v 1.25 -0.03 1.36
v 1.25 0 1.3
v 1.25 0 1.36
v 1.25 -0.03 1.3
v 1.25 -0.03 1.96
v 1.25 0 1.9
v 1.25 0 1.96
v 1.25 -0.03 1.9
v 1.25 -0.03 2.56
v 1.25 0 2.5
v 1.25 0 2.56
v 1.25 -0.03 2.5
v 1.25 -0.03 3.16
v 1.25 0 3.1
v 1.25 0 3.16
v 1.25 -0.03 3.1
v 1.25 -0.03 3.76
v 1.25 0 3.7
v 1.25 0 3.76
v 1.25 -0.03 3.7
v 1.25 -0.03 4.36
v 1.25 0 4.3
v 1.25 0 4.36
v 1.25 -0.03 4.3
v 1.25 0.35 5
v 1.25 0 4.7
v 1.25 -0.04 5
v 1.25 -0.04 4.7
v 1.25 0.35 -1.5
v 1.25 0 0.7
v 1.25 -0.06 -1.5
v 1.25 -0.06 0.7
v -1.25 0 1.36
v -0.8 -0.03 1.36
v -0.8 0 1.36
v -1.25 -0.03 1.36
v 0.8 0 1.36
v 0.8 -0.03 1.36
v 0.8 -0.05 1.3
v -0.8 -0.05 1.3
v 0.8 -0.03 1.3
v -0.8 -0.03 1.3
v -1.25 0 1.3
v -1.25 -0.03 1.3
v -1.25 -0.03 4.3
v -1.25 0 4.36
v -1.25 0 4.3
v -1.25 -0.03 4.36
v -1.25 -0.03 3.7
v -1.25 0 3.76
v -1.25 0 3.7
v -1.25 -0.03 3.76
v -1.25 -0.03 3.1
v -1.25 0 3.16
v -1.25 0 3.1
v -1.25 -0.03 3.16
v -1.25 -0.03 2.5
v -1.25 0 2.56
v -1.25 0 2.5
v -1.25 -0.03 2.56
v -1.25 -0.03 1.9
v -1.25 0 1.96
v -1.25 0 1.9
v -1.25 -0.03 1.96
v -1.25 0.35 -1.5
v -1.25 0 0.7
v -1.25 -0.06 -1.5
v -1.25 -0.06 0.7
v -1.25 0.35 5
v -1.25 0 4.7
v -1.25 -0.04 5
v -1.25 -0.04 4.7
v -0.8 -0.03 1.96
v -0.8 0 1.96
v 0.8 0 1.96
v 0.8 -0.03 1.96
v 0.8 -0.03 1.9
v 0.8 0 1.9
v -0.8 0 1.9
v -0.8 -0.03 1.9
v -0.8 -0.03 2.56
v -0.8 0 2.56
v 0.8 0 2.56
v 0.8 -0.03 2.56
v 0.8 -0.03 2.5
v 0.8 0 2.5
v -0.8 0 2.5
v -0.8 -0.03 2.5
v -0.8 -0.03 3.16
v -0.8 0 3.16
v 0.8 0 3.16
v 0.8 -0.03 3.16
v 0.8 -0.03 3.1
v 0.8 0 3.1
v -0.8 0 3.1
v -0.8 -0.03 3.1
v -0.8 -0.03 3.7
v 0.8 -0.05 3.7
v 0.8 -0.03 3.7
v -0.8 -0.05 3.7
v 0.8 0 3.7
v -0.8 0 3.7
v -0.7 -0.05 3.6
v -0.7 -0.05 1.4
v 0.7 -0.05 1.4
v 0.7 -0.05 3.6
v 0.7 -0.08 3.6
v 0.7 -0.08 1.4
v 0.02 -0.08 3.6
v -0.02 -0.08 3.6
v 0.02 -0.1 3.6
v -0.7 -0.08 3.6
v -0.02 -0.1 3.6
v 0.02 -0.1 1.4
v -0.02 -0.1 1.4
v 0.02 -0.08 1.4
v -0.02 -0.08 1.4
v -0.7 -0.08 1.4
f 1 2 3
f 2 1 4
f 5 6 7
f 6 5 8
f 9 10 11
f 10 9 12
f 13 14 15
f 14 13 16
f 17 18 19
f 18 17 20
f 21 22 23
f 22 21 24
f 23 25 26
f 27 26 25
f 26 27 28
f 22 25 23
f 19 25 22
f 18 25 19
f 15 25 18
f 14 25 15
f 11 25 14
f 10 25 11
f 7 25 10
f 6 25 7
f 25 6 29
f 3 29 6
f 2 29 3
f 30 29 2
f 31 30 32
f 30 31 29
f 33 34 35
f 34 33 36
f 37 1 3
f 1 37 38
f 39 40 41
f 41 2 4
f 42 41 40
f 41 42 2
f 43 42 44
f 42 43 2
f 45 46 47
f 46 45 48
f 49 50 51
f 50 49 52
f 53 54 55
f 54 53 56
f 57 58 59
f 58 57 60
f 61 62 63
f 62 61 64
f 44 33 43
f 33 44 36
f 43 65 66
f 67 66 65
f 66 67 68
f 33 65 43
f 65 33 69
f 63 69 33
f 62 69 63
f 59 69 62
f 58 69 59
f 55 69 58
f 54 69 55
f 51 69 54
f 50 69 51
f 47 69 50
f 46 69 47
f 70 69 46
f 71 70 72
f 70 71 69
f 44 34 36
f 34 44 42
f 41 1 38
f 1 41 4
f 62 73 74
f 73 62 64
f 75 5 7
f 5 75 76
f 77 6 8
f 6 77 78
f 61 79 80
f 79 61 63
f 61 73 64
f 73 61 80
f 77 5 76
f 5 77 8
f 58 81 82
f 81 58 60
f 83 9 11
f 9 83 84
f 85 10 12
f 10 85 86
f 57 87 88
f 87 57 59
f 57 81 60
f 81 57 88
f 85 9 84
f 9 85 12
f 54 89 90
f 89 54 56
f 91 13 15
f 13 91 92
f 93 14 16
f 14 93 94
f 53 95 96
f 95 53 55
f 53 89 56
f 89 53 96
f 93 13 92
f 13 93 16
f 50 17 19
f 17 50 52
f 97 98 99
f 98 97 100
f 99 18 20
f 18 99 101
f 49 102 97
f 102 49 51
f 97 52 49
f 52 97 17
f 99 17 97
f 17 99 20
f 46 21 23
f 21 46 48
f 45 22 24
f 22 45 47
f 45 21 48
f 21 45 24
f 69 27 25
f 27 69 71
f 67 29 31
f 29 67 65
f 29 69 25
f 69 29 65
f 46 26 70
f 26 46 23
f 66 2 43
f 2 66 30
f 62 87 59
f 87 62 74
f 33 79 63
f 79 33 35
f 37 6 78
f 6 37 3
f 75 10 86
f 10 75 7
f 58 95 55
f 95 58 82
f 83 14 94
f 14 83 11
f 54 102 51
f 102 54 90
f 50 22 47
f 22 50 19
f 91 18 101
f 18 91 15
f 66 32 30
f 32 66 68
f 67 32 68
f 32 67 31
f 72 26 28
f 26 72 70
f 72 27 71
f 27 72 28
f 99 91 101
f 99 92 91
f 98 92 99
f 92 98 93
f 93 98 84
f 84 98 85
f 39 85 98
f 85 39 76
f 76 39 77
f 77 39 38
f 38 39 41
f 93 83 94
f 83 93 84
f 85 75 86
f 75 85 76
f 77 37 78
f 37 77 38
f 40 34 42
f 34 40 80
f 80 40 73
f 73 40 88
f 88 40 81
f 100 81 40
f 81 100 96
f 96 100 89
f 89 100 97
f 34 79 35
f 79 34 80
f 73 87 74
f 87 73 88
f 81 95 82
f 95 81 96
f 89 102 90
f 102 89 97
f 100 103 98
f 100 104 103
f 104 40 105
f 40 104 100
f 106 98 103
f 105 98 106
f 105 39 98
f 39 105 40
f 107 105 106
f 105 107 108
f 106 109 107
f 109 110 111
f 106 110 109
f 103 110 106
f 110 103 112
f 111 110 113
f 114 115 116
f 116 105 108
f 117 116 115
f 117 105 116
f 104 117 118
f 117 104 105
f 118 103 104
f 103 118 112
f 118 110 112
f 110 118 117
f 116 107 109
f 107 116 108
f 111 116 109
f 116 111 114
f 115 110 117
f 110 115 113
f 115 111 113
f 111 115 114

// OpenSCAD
// file: lib/lodge_kit.scad
// Lodge shell tile kit — shared dimensions and modules.
//
// The game paints a lodge footprint in 5 m cells and resolves the
// exterior from these tiles at half-cell (2.5 m) resolution; see
// internal/world/lodge_shell.go. Every tile is authored in the same
// canonical frame:
//
//   * origin on the lodge floor plane (Z = 0);
//   * wall-type tiles sit on a footprint edge, centred on it, with the
//     OUTSIDE toward SCAD −Y (game +Z) and the wall thickness toward +Y;
//   * roof tiles are centred on a half-cell, with Z = 0 at the tile's
//     lowest corner; slopes fall toward −Y (game +Z);
//   * corner tiles sit on a grid vertex; an outer corner's building is
//     in the SCAD (−X, +Y) quadrant, an inner corner's notch in (+X, −Y).
//
// Colours are near-neutral: the renderer tints walls and roofs per lodge
// from a seeded palette (world.ShellPalette).
//
// Keep these in sync with the constants in lodge_shell.go.

tile   = 2.5;   // ShellTileSize
wall_h = 5.0;   // ShellWallHeight
rise   = 2.1;   // ShellRoofRise, per tile of run
pitch  = rise / tile;

wall_t   = 0.35;  // wall thickness
sink     = 1.5;   // walls run this far below the floor to hide pad grading
roof_t   = 0.25;  // roof slab thickness
overhang = 0.7;   // eaves overhang past the wall plane

c_wall   = [0.92, 0.90, 0.86];
c_stone  = [0.62, 0.61, 0.60];
c_trim   = [0.97, 0.97, 0.95];
c_glass  = [0.30, 0.42, 0.52];
c_door   = [0.36, 0.25, 0.18];
c_roof   = [0.97, 0.97, 0.97];
c_fascia = [0.55, 0.52, 0.50];

// Plain wall panel: timber above a stone plinth, a trim band under the
// eaves.
module wall_panel() {
    color(c_wall)
        translate([-tile/2, 0, -sink]) cube([tile, wall_t, wall_h + sink]);
    color(c_stone)
        translate([-tile/2, -0.06, -sink]) cube([tile, wall_t, sink + 0.7]);
    color(c_trim)
        translate([-tile/2, -0.04, wall_h - 0.3]) cube([tile, 0.1, 0.3]);
    battens();
}

// Horizontal board lines above the plinth.
module battens() {
    color(c_wall * 0.8)
        for (z = [1.3 : 0.6 : wall_h - 0.6])
            translate([-tile/2, -0.03, z]) cube([tile, 0.04, 0.06]);
}

// A framed pane on the outer face. x0/w along the wall, z0/h up it.
module pane(x0, w, z0, h) {
    color(c_trim)
        translate([x0 - 0.1, -0.05, z0 - 0.1]) cube([w + 0.2, 0.06, h + 0.2]);
    color(c_glass)
        translate([x0, -0.08, z0]) cube([w, 0.06, h]);
}

module wall_window() {
    wall_panel();
    pane(-0.7, 1.4, 1.4, 2.2);
    color(c_trim) translate([-0.02, -0.1, 1.4]) cube([0.04, 0.04, 2.2]); // mullion
}

// Tall window flanked by shutters.
module wall_window_alt() {
    wall_panel();
    pane(-0.5, 1.0, 1.2, 2.8);
    color(c_door) {
        translate([-1.0, -0.1, 1.2]) cube([0.4, 0.05, 2.8]);
        translate([ 0.6, -0.1, 1.2]) cube([0.4, 0.05, 2.8]);
    }
}

// Floor-to-eave glazing for food courts: a low stone sill, then glass in
// three lights.
module wall_glazed() {
    color(c_wall)
        translate([-tile/2, 0, -sink]) cube([tile, wall_t, wall_h + sink]);
    color(c_stone)
        translate([-tile/2, -0.06, -sink]) cube([tile, wall_t, sink + 0.35]);
    color(c_glass)
        translate([-tile/2, -0.09, 0.35]) cube([tile, 0.06, wall_h - 0.75]);
    color(c_trim) {
        for (x = [-tile/2, -tile/6, tile/6, tile/2 - 0.08])
            translate([x, -0.12, 0.35]) cube([0.08, 0.06, wall_h - 0.75]);
        translate([-tile/2, -0.12, wall_h - 0.45]) cube([tile, 0.07, 0.1]);
    }
}

// Glazed entry door under a small canopy, with a step.
module door() {
    color(c_wall)
        translate([-tile/2, 0, -sink]) cube([tile, wall_t, wall_h + sink]);
    color(c_stone)
        translate([-tile/2, -0.06, -sink]) cube([tile, wall_t, sink + 0.15]);
    battens();
    color(c_door)
        translate([-0.9, -0.1, 0]) cube([1.8, 0.1, 2.7]);
    color(c_glass) {
        translate([-0.75, -0.13, 0.9]) cube([0.65, 0.05, 1.6]);
        translate([ 0.10, -0.13, 0.9]) cube([0.65, 0.05, 1.6]);
    }
    color(c_trim)
        translate([-tile/2, -0.04, wall_h - 0.3]) cube([tile, 0.1, 0.3]);
    color(c_roof)   // canopy
        translate([-1.2, -1.3, 3.0])
            rotate([-12, 0, 0]) cube([2.4, 1.3, 0.12]);
    color(c_stone)  // step
        translate([-1.1, -0.9, -0.3]) cube([2.2, 0.9, 0.42]);
}

module corner_outer() {
    color(c_stone)
        translate([-0.3, -0.05, -sink]) cube([0.35, 0.35, wall_h + sink - 0.3]);
}

module corner_inner() {
    color(c_trim)
        translate([0, -0.12, 0]) cube([0.12, 0.12, wall_h - 0.3]);
}

// Roof slab over one half-cell. h lists corner heights (in rise units)
// in SCAD order (−X,+Y), (+X,+Y), (+X,−Y), (−X,−Y); split names which
// diagonal the top surface folds along: 0 through corners 0–2, 1
// through corners 1–3.
module roof_tile(h, split) {
    p = [[-tile/2, tile/2], [tile/2, tile/2], [tile/2, -tile/2], [-tile/2, -tile/2]];
    top = [for (i = [0:3]) [p[i][0], p[i][1], h[i] * rise]];
    bot = [for (i = [0:3]) [p[i][0], p[i][1], h[i] * rise - roof_t]];
    tris = split == 0 ? [[0, 1, 2], [0, 2, 3]] : [[0, 1, 3], [1, 2, 3]];
    color(c_roof)
        polyhedron(
            points = concat(top, bot),
            faces = concat(
                // top (clockwise seen from above = outward in OpenSCAD)
                [for (t = tris) [t[0], t[1], t[2]]],
                [for (t = tris) [t[2] + 4, t[1] + 4, t[0] + 4]],
                [for (i = [0:3]) [i, i + 4, (i + 1) % 4 + 4, (i + 1) % 4]]
            ));
}

// Eaves strip past a wall edge: continues the roof plane outward and
// down, finished with a fascia board.
module eave() {
    drop = overhang * pitch;
    color(c_roof)
        polyhedron(
            points = [
                [-tile/2, 0, 0], [tile/2, 0, 0], [tile/2, -overhang, -drop], [-tile/2, -overhang, -drop],
                [-tile/2, 0, -roof_t], [tile/2, 0, -roof_t], [tile/2, -overhang, -drop - roof_t], [-tile/2, -overhang, -drop - roof_t],
            ],
            faces = [[0, 1, 2, 3], [7, 6, 5, 4], [0, 4, 5, 1], [1, 5, 6, 2], [2, 6, 7, 3], [3, 7, 4, 0]]);
    color(c_fascia)
        translate([-tile/2, -overhang - 0.05, -drop - roof_t - 0.1]) cube([tile, 0.08, roof_t + 0.2]);
}

// Eaves in the square past an outer corner: a hip folding along the
// diagonal away from the building.
module eave_corner() {
    o = overhang;
    d = o * pitch;
    color(c_roof)
        polyhedron(
            points = [
                [0, 0, 0], [o, 0, -d], [o, -o, -d], [0, -o, -d],
                [0, 0, -roof_t], [o, 0, -d - roof_t], [o, -o, -d - roof_t], [0, -o, -d - roof_t],
            ],
            faces = [[0, 1, 2], [0, 2, 3], [6, 5, 4], [7, 6, 4], [0, 4, 5, 1], [1, 5, 6, 2], [2, 6, 7, 3], [3, 7, 4, 0]]);
    color(c_fascia) {
        translate([0, -o - 0.05, -d - roof_t - 0.1]) cube([o + 0.05, 0.08, roof_t + 0.2]);
        translate([o - 0.03, -o - 0.05, -d - roof_t - 0.1]) cube([0.08, o + 0.05, roof_t + 0.2]);
    }
}

module chimney() {
    color(c_stone)
        translate([-0.55, -0.55, -1.0]) cube([1.1, 1.1, rise + 3.0]);
    color(c_fascia)
        translate([-0.65, -0.65, rise + 1.8]) cube([1.3, 1.3, 0.2]);
}
// main file
// Lodge shell kit: wall with a window. See lib/lodge_kit.scad.
include <lib/lodge_kit.scad>
wall_window();
